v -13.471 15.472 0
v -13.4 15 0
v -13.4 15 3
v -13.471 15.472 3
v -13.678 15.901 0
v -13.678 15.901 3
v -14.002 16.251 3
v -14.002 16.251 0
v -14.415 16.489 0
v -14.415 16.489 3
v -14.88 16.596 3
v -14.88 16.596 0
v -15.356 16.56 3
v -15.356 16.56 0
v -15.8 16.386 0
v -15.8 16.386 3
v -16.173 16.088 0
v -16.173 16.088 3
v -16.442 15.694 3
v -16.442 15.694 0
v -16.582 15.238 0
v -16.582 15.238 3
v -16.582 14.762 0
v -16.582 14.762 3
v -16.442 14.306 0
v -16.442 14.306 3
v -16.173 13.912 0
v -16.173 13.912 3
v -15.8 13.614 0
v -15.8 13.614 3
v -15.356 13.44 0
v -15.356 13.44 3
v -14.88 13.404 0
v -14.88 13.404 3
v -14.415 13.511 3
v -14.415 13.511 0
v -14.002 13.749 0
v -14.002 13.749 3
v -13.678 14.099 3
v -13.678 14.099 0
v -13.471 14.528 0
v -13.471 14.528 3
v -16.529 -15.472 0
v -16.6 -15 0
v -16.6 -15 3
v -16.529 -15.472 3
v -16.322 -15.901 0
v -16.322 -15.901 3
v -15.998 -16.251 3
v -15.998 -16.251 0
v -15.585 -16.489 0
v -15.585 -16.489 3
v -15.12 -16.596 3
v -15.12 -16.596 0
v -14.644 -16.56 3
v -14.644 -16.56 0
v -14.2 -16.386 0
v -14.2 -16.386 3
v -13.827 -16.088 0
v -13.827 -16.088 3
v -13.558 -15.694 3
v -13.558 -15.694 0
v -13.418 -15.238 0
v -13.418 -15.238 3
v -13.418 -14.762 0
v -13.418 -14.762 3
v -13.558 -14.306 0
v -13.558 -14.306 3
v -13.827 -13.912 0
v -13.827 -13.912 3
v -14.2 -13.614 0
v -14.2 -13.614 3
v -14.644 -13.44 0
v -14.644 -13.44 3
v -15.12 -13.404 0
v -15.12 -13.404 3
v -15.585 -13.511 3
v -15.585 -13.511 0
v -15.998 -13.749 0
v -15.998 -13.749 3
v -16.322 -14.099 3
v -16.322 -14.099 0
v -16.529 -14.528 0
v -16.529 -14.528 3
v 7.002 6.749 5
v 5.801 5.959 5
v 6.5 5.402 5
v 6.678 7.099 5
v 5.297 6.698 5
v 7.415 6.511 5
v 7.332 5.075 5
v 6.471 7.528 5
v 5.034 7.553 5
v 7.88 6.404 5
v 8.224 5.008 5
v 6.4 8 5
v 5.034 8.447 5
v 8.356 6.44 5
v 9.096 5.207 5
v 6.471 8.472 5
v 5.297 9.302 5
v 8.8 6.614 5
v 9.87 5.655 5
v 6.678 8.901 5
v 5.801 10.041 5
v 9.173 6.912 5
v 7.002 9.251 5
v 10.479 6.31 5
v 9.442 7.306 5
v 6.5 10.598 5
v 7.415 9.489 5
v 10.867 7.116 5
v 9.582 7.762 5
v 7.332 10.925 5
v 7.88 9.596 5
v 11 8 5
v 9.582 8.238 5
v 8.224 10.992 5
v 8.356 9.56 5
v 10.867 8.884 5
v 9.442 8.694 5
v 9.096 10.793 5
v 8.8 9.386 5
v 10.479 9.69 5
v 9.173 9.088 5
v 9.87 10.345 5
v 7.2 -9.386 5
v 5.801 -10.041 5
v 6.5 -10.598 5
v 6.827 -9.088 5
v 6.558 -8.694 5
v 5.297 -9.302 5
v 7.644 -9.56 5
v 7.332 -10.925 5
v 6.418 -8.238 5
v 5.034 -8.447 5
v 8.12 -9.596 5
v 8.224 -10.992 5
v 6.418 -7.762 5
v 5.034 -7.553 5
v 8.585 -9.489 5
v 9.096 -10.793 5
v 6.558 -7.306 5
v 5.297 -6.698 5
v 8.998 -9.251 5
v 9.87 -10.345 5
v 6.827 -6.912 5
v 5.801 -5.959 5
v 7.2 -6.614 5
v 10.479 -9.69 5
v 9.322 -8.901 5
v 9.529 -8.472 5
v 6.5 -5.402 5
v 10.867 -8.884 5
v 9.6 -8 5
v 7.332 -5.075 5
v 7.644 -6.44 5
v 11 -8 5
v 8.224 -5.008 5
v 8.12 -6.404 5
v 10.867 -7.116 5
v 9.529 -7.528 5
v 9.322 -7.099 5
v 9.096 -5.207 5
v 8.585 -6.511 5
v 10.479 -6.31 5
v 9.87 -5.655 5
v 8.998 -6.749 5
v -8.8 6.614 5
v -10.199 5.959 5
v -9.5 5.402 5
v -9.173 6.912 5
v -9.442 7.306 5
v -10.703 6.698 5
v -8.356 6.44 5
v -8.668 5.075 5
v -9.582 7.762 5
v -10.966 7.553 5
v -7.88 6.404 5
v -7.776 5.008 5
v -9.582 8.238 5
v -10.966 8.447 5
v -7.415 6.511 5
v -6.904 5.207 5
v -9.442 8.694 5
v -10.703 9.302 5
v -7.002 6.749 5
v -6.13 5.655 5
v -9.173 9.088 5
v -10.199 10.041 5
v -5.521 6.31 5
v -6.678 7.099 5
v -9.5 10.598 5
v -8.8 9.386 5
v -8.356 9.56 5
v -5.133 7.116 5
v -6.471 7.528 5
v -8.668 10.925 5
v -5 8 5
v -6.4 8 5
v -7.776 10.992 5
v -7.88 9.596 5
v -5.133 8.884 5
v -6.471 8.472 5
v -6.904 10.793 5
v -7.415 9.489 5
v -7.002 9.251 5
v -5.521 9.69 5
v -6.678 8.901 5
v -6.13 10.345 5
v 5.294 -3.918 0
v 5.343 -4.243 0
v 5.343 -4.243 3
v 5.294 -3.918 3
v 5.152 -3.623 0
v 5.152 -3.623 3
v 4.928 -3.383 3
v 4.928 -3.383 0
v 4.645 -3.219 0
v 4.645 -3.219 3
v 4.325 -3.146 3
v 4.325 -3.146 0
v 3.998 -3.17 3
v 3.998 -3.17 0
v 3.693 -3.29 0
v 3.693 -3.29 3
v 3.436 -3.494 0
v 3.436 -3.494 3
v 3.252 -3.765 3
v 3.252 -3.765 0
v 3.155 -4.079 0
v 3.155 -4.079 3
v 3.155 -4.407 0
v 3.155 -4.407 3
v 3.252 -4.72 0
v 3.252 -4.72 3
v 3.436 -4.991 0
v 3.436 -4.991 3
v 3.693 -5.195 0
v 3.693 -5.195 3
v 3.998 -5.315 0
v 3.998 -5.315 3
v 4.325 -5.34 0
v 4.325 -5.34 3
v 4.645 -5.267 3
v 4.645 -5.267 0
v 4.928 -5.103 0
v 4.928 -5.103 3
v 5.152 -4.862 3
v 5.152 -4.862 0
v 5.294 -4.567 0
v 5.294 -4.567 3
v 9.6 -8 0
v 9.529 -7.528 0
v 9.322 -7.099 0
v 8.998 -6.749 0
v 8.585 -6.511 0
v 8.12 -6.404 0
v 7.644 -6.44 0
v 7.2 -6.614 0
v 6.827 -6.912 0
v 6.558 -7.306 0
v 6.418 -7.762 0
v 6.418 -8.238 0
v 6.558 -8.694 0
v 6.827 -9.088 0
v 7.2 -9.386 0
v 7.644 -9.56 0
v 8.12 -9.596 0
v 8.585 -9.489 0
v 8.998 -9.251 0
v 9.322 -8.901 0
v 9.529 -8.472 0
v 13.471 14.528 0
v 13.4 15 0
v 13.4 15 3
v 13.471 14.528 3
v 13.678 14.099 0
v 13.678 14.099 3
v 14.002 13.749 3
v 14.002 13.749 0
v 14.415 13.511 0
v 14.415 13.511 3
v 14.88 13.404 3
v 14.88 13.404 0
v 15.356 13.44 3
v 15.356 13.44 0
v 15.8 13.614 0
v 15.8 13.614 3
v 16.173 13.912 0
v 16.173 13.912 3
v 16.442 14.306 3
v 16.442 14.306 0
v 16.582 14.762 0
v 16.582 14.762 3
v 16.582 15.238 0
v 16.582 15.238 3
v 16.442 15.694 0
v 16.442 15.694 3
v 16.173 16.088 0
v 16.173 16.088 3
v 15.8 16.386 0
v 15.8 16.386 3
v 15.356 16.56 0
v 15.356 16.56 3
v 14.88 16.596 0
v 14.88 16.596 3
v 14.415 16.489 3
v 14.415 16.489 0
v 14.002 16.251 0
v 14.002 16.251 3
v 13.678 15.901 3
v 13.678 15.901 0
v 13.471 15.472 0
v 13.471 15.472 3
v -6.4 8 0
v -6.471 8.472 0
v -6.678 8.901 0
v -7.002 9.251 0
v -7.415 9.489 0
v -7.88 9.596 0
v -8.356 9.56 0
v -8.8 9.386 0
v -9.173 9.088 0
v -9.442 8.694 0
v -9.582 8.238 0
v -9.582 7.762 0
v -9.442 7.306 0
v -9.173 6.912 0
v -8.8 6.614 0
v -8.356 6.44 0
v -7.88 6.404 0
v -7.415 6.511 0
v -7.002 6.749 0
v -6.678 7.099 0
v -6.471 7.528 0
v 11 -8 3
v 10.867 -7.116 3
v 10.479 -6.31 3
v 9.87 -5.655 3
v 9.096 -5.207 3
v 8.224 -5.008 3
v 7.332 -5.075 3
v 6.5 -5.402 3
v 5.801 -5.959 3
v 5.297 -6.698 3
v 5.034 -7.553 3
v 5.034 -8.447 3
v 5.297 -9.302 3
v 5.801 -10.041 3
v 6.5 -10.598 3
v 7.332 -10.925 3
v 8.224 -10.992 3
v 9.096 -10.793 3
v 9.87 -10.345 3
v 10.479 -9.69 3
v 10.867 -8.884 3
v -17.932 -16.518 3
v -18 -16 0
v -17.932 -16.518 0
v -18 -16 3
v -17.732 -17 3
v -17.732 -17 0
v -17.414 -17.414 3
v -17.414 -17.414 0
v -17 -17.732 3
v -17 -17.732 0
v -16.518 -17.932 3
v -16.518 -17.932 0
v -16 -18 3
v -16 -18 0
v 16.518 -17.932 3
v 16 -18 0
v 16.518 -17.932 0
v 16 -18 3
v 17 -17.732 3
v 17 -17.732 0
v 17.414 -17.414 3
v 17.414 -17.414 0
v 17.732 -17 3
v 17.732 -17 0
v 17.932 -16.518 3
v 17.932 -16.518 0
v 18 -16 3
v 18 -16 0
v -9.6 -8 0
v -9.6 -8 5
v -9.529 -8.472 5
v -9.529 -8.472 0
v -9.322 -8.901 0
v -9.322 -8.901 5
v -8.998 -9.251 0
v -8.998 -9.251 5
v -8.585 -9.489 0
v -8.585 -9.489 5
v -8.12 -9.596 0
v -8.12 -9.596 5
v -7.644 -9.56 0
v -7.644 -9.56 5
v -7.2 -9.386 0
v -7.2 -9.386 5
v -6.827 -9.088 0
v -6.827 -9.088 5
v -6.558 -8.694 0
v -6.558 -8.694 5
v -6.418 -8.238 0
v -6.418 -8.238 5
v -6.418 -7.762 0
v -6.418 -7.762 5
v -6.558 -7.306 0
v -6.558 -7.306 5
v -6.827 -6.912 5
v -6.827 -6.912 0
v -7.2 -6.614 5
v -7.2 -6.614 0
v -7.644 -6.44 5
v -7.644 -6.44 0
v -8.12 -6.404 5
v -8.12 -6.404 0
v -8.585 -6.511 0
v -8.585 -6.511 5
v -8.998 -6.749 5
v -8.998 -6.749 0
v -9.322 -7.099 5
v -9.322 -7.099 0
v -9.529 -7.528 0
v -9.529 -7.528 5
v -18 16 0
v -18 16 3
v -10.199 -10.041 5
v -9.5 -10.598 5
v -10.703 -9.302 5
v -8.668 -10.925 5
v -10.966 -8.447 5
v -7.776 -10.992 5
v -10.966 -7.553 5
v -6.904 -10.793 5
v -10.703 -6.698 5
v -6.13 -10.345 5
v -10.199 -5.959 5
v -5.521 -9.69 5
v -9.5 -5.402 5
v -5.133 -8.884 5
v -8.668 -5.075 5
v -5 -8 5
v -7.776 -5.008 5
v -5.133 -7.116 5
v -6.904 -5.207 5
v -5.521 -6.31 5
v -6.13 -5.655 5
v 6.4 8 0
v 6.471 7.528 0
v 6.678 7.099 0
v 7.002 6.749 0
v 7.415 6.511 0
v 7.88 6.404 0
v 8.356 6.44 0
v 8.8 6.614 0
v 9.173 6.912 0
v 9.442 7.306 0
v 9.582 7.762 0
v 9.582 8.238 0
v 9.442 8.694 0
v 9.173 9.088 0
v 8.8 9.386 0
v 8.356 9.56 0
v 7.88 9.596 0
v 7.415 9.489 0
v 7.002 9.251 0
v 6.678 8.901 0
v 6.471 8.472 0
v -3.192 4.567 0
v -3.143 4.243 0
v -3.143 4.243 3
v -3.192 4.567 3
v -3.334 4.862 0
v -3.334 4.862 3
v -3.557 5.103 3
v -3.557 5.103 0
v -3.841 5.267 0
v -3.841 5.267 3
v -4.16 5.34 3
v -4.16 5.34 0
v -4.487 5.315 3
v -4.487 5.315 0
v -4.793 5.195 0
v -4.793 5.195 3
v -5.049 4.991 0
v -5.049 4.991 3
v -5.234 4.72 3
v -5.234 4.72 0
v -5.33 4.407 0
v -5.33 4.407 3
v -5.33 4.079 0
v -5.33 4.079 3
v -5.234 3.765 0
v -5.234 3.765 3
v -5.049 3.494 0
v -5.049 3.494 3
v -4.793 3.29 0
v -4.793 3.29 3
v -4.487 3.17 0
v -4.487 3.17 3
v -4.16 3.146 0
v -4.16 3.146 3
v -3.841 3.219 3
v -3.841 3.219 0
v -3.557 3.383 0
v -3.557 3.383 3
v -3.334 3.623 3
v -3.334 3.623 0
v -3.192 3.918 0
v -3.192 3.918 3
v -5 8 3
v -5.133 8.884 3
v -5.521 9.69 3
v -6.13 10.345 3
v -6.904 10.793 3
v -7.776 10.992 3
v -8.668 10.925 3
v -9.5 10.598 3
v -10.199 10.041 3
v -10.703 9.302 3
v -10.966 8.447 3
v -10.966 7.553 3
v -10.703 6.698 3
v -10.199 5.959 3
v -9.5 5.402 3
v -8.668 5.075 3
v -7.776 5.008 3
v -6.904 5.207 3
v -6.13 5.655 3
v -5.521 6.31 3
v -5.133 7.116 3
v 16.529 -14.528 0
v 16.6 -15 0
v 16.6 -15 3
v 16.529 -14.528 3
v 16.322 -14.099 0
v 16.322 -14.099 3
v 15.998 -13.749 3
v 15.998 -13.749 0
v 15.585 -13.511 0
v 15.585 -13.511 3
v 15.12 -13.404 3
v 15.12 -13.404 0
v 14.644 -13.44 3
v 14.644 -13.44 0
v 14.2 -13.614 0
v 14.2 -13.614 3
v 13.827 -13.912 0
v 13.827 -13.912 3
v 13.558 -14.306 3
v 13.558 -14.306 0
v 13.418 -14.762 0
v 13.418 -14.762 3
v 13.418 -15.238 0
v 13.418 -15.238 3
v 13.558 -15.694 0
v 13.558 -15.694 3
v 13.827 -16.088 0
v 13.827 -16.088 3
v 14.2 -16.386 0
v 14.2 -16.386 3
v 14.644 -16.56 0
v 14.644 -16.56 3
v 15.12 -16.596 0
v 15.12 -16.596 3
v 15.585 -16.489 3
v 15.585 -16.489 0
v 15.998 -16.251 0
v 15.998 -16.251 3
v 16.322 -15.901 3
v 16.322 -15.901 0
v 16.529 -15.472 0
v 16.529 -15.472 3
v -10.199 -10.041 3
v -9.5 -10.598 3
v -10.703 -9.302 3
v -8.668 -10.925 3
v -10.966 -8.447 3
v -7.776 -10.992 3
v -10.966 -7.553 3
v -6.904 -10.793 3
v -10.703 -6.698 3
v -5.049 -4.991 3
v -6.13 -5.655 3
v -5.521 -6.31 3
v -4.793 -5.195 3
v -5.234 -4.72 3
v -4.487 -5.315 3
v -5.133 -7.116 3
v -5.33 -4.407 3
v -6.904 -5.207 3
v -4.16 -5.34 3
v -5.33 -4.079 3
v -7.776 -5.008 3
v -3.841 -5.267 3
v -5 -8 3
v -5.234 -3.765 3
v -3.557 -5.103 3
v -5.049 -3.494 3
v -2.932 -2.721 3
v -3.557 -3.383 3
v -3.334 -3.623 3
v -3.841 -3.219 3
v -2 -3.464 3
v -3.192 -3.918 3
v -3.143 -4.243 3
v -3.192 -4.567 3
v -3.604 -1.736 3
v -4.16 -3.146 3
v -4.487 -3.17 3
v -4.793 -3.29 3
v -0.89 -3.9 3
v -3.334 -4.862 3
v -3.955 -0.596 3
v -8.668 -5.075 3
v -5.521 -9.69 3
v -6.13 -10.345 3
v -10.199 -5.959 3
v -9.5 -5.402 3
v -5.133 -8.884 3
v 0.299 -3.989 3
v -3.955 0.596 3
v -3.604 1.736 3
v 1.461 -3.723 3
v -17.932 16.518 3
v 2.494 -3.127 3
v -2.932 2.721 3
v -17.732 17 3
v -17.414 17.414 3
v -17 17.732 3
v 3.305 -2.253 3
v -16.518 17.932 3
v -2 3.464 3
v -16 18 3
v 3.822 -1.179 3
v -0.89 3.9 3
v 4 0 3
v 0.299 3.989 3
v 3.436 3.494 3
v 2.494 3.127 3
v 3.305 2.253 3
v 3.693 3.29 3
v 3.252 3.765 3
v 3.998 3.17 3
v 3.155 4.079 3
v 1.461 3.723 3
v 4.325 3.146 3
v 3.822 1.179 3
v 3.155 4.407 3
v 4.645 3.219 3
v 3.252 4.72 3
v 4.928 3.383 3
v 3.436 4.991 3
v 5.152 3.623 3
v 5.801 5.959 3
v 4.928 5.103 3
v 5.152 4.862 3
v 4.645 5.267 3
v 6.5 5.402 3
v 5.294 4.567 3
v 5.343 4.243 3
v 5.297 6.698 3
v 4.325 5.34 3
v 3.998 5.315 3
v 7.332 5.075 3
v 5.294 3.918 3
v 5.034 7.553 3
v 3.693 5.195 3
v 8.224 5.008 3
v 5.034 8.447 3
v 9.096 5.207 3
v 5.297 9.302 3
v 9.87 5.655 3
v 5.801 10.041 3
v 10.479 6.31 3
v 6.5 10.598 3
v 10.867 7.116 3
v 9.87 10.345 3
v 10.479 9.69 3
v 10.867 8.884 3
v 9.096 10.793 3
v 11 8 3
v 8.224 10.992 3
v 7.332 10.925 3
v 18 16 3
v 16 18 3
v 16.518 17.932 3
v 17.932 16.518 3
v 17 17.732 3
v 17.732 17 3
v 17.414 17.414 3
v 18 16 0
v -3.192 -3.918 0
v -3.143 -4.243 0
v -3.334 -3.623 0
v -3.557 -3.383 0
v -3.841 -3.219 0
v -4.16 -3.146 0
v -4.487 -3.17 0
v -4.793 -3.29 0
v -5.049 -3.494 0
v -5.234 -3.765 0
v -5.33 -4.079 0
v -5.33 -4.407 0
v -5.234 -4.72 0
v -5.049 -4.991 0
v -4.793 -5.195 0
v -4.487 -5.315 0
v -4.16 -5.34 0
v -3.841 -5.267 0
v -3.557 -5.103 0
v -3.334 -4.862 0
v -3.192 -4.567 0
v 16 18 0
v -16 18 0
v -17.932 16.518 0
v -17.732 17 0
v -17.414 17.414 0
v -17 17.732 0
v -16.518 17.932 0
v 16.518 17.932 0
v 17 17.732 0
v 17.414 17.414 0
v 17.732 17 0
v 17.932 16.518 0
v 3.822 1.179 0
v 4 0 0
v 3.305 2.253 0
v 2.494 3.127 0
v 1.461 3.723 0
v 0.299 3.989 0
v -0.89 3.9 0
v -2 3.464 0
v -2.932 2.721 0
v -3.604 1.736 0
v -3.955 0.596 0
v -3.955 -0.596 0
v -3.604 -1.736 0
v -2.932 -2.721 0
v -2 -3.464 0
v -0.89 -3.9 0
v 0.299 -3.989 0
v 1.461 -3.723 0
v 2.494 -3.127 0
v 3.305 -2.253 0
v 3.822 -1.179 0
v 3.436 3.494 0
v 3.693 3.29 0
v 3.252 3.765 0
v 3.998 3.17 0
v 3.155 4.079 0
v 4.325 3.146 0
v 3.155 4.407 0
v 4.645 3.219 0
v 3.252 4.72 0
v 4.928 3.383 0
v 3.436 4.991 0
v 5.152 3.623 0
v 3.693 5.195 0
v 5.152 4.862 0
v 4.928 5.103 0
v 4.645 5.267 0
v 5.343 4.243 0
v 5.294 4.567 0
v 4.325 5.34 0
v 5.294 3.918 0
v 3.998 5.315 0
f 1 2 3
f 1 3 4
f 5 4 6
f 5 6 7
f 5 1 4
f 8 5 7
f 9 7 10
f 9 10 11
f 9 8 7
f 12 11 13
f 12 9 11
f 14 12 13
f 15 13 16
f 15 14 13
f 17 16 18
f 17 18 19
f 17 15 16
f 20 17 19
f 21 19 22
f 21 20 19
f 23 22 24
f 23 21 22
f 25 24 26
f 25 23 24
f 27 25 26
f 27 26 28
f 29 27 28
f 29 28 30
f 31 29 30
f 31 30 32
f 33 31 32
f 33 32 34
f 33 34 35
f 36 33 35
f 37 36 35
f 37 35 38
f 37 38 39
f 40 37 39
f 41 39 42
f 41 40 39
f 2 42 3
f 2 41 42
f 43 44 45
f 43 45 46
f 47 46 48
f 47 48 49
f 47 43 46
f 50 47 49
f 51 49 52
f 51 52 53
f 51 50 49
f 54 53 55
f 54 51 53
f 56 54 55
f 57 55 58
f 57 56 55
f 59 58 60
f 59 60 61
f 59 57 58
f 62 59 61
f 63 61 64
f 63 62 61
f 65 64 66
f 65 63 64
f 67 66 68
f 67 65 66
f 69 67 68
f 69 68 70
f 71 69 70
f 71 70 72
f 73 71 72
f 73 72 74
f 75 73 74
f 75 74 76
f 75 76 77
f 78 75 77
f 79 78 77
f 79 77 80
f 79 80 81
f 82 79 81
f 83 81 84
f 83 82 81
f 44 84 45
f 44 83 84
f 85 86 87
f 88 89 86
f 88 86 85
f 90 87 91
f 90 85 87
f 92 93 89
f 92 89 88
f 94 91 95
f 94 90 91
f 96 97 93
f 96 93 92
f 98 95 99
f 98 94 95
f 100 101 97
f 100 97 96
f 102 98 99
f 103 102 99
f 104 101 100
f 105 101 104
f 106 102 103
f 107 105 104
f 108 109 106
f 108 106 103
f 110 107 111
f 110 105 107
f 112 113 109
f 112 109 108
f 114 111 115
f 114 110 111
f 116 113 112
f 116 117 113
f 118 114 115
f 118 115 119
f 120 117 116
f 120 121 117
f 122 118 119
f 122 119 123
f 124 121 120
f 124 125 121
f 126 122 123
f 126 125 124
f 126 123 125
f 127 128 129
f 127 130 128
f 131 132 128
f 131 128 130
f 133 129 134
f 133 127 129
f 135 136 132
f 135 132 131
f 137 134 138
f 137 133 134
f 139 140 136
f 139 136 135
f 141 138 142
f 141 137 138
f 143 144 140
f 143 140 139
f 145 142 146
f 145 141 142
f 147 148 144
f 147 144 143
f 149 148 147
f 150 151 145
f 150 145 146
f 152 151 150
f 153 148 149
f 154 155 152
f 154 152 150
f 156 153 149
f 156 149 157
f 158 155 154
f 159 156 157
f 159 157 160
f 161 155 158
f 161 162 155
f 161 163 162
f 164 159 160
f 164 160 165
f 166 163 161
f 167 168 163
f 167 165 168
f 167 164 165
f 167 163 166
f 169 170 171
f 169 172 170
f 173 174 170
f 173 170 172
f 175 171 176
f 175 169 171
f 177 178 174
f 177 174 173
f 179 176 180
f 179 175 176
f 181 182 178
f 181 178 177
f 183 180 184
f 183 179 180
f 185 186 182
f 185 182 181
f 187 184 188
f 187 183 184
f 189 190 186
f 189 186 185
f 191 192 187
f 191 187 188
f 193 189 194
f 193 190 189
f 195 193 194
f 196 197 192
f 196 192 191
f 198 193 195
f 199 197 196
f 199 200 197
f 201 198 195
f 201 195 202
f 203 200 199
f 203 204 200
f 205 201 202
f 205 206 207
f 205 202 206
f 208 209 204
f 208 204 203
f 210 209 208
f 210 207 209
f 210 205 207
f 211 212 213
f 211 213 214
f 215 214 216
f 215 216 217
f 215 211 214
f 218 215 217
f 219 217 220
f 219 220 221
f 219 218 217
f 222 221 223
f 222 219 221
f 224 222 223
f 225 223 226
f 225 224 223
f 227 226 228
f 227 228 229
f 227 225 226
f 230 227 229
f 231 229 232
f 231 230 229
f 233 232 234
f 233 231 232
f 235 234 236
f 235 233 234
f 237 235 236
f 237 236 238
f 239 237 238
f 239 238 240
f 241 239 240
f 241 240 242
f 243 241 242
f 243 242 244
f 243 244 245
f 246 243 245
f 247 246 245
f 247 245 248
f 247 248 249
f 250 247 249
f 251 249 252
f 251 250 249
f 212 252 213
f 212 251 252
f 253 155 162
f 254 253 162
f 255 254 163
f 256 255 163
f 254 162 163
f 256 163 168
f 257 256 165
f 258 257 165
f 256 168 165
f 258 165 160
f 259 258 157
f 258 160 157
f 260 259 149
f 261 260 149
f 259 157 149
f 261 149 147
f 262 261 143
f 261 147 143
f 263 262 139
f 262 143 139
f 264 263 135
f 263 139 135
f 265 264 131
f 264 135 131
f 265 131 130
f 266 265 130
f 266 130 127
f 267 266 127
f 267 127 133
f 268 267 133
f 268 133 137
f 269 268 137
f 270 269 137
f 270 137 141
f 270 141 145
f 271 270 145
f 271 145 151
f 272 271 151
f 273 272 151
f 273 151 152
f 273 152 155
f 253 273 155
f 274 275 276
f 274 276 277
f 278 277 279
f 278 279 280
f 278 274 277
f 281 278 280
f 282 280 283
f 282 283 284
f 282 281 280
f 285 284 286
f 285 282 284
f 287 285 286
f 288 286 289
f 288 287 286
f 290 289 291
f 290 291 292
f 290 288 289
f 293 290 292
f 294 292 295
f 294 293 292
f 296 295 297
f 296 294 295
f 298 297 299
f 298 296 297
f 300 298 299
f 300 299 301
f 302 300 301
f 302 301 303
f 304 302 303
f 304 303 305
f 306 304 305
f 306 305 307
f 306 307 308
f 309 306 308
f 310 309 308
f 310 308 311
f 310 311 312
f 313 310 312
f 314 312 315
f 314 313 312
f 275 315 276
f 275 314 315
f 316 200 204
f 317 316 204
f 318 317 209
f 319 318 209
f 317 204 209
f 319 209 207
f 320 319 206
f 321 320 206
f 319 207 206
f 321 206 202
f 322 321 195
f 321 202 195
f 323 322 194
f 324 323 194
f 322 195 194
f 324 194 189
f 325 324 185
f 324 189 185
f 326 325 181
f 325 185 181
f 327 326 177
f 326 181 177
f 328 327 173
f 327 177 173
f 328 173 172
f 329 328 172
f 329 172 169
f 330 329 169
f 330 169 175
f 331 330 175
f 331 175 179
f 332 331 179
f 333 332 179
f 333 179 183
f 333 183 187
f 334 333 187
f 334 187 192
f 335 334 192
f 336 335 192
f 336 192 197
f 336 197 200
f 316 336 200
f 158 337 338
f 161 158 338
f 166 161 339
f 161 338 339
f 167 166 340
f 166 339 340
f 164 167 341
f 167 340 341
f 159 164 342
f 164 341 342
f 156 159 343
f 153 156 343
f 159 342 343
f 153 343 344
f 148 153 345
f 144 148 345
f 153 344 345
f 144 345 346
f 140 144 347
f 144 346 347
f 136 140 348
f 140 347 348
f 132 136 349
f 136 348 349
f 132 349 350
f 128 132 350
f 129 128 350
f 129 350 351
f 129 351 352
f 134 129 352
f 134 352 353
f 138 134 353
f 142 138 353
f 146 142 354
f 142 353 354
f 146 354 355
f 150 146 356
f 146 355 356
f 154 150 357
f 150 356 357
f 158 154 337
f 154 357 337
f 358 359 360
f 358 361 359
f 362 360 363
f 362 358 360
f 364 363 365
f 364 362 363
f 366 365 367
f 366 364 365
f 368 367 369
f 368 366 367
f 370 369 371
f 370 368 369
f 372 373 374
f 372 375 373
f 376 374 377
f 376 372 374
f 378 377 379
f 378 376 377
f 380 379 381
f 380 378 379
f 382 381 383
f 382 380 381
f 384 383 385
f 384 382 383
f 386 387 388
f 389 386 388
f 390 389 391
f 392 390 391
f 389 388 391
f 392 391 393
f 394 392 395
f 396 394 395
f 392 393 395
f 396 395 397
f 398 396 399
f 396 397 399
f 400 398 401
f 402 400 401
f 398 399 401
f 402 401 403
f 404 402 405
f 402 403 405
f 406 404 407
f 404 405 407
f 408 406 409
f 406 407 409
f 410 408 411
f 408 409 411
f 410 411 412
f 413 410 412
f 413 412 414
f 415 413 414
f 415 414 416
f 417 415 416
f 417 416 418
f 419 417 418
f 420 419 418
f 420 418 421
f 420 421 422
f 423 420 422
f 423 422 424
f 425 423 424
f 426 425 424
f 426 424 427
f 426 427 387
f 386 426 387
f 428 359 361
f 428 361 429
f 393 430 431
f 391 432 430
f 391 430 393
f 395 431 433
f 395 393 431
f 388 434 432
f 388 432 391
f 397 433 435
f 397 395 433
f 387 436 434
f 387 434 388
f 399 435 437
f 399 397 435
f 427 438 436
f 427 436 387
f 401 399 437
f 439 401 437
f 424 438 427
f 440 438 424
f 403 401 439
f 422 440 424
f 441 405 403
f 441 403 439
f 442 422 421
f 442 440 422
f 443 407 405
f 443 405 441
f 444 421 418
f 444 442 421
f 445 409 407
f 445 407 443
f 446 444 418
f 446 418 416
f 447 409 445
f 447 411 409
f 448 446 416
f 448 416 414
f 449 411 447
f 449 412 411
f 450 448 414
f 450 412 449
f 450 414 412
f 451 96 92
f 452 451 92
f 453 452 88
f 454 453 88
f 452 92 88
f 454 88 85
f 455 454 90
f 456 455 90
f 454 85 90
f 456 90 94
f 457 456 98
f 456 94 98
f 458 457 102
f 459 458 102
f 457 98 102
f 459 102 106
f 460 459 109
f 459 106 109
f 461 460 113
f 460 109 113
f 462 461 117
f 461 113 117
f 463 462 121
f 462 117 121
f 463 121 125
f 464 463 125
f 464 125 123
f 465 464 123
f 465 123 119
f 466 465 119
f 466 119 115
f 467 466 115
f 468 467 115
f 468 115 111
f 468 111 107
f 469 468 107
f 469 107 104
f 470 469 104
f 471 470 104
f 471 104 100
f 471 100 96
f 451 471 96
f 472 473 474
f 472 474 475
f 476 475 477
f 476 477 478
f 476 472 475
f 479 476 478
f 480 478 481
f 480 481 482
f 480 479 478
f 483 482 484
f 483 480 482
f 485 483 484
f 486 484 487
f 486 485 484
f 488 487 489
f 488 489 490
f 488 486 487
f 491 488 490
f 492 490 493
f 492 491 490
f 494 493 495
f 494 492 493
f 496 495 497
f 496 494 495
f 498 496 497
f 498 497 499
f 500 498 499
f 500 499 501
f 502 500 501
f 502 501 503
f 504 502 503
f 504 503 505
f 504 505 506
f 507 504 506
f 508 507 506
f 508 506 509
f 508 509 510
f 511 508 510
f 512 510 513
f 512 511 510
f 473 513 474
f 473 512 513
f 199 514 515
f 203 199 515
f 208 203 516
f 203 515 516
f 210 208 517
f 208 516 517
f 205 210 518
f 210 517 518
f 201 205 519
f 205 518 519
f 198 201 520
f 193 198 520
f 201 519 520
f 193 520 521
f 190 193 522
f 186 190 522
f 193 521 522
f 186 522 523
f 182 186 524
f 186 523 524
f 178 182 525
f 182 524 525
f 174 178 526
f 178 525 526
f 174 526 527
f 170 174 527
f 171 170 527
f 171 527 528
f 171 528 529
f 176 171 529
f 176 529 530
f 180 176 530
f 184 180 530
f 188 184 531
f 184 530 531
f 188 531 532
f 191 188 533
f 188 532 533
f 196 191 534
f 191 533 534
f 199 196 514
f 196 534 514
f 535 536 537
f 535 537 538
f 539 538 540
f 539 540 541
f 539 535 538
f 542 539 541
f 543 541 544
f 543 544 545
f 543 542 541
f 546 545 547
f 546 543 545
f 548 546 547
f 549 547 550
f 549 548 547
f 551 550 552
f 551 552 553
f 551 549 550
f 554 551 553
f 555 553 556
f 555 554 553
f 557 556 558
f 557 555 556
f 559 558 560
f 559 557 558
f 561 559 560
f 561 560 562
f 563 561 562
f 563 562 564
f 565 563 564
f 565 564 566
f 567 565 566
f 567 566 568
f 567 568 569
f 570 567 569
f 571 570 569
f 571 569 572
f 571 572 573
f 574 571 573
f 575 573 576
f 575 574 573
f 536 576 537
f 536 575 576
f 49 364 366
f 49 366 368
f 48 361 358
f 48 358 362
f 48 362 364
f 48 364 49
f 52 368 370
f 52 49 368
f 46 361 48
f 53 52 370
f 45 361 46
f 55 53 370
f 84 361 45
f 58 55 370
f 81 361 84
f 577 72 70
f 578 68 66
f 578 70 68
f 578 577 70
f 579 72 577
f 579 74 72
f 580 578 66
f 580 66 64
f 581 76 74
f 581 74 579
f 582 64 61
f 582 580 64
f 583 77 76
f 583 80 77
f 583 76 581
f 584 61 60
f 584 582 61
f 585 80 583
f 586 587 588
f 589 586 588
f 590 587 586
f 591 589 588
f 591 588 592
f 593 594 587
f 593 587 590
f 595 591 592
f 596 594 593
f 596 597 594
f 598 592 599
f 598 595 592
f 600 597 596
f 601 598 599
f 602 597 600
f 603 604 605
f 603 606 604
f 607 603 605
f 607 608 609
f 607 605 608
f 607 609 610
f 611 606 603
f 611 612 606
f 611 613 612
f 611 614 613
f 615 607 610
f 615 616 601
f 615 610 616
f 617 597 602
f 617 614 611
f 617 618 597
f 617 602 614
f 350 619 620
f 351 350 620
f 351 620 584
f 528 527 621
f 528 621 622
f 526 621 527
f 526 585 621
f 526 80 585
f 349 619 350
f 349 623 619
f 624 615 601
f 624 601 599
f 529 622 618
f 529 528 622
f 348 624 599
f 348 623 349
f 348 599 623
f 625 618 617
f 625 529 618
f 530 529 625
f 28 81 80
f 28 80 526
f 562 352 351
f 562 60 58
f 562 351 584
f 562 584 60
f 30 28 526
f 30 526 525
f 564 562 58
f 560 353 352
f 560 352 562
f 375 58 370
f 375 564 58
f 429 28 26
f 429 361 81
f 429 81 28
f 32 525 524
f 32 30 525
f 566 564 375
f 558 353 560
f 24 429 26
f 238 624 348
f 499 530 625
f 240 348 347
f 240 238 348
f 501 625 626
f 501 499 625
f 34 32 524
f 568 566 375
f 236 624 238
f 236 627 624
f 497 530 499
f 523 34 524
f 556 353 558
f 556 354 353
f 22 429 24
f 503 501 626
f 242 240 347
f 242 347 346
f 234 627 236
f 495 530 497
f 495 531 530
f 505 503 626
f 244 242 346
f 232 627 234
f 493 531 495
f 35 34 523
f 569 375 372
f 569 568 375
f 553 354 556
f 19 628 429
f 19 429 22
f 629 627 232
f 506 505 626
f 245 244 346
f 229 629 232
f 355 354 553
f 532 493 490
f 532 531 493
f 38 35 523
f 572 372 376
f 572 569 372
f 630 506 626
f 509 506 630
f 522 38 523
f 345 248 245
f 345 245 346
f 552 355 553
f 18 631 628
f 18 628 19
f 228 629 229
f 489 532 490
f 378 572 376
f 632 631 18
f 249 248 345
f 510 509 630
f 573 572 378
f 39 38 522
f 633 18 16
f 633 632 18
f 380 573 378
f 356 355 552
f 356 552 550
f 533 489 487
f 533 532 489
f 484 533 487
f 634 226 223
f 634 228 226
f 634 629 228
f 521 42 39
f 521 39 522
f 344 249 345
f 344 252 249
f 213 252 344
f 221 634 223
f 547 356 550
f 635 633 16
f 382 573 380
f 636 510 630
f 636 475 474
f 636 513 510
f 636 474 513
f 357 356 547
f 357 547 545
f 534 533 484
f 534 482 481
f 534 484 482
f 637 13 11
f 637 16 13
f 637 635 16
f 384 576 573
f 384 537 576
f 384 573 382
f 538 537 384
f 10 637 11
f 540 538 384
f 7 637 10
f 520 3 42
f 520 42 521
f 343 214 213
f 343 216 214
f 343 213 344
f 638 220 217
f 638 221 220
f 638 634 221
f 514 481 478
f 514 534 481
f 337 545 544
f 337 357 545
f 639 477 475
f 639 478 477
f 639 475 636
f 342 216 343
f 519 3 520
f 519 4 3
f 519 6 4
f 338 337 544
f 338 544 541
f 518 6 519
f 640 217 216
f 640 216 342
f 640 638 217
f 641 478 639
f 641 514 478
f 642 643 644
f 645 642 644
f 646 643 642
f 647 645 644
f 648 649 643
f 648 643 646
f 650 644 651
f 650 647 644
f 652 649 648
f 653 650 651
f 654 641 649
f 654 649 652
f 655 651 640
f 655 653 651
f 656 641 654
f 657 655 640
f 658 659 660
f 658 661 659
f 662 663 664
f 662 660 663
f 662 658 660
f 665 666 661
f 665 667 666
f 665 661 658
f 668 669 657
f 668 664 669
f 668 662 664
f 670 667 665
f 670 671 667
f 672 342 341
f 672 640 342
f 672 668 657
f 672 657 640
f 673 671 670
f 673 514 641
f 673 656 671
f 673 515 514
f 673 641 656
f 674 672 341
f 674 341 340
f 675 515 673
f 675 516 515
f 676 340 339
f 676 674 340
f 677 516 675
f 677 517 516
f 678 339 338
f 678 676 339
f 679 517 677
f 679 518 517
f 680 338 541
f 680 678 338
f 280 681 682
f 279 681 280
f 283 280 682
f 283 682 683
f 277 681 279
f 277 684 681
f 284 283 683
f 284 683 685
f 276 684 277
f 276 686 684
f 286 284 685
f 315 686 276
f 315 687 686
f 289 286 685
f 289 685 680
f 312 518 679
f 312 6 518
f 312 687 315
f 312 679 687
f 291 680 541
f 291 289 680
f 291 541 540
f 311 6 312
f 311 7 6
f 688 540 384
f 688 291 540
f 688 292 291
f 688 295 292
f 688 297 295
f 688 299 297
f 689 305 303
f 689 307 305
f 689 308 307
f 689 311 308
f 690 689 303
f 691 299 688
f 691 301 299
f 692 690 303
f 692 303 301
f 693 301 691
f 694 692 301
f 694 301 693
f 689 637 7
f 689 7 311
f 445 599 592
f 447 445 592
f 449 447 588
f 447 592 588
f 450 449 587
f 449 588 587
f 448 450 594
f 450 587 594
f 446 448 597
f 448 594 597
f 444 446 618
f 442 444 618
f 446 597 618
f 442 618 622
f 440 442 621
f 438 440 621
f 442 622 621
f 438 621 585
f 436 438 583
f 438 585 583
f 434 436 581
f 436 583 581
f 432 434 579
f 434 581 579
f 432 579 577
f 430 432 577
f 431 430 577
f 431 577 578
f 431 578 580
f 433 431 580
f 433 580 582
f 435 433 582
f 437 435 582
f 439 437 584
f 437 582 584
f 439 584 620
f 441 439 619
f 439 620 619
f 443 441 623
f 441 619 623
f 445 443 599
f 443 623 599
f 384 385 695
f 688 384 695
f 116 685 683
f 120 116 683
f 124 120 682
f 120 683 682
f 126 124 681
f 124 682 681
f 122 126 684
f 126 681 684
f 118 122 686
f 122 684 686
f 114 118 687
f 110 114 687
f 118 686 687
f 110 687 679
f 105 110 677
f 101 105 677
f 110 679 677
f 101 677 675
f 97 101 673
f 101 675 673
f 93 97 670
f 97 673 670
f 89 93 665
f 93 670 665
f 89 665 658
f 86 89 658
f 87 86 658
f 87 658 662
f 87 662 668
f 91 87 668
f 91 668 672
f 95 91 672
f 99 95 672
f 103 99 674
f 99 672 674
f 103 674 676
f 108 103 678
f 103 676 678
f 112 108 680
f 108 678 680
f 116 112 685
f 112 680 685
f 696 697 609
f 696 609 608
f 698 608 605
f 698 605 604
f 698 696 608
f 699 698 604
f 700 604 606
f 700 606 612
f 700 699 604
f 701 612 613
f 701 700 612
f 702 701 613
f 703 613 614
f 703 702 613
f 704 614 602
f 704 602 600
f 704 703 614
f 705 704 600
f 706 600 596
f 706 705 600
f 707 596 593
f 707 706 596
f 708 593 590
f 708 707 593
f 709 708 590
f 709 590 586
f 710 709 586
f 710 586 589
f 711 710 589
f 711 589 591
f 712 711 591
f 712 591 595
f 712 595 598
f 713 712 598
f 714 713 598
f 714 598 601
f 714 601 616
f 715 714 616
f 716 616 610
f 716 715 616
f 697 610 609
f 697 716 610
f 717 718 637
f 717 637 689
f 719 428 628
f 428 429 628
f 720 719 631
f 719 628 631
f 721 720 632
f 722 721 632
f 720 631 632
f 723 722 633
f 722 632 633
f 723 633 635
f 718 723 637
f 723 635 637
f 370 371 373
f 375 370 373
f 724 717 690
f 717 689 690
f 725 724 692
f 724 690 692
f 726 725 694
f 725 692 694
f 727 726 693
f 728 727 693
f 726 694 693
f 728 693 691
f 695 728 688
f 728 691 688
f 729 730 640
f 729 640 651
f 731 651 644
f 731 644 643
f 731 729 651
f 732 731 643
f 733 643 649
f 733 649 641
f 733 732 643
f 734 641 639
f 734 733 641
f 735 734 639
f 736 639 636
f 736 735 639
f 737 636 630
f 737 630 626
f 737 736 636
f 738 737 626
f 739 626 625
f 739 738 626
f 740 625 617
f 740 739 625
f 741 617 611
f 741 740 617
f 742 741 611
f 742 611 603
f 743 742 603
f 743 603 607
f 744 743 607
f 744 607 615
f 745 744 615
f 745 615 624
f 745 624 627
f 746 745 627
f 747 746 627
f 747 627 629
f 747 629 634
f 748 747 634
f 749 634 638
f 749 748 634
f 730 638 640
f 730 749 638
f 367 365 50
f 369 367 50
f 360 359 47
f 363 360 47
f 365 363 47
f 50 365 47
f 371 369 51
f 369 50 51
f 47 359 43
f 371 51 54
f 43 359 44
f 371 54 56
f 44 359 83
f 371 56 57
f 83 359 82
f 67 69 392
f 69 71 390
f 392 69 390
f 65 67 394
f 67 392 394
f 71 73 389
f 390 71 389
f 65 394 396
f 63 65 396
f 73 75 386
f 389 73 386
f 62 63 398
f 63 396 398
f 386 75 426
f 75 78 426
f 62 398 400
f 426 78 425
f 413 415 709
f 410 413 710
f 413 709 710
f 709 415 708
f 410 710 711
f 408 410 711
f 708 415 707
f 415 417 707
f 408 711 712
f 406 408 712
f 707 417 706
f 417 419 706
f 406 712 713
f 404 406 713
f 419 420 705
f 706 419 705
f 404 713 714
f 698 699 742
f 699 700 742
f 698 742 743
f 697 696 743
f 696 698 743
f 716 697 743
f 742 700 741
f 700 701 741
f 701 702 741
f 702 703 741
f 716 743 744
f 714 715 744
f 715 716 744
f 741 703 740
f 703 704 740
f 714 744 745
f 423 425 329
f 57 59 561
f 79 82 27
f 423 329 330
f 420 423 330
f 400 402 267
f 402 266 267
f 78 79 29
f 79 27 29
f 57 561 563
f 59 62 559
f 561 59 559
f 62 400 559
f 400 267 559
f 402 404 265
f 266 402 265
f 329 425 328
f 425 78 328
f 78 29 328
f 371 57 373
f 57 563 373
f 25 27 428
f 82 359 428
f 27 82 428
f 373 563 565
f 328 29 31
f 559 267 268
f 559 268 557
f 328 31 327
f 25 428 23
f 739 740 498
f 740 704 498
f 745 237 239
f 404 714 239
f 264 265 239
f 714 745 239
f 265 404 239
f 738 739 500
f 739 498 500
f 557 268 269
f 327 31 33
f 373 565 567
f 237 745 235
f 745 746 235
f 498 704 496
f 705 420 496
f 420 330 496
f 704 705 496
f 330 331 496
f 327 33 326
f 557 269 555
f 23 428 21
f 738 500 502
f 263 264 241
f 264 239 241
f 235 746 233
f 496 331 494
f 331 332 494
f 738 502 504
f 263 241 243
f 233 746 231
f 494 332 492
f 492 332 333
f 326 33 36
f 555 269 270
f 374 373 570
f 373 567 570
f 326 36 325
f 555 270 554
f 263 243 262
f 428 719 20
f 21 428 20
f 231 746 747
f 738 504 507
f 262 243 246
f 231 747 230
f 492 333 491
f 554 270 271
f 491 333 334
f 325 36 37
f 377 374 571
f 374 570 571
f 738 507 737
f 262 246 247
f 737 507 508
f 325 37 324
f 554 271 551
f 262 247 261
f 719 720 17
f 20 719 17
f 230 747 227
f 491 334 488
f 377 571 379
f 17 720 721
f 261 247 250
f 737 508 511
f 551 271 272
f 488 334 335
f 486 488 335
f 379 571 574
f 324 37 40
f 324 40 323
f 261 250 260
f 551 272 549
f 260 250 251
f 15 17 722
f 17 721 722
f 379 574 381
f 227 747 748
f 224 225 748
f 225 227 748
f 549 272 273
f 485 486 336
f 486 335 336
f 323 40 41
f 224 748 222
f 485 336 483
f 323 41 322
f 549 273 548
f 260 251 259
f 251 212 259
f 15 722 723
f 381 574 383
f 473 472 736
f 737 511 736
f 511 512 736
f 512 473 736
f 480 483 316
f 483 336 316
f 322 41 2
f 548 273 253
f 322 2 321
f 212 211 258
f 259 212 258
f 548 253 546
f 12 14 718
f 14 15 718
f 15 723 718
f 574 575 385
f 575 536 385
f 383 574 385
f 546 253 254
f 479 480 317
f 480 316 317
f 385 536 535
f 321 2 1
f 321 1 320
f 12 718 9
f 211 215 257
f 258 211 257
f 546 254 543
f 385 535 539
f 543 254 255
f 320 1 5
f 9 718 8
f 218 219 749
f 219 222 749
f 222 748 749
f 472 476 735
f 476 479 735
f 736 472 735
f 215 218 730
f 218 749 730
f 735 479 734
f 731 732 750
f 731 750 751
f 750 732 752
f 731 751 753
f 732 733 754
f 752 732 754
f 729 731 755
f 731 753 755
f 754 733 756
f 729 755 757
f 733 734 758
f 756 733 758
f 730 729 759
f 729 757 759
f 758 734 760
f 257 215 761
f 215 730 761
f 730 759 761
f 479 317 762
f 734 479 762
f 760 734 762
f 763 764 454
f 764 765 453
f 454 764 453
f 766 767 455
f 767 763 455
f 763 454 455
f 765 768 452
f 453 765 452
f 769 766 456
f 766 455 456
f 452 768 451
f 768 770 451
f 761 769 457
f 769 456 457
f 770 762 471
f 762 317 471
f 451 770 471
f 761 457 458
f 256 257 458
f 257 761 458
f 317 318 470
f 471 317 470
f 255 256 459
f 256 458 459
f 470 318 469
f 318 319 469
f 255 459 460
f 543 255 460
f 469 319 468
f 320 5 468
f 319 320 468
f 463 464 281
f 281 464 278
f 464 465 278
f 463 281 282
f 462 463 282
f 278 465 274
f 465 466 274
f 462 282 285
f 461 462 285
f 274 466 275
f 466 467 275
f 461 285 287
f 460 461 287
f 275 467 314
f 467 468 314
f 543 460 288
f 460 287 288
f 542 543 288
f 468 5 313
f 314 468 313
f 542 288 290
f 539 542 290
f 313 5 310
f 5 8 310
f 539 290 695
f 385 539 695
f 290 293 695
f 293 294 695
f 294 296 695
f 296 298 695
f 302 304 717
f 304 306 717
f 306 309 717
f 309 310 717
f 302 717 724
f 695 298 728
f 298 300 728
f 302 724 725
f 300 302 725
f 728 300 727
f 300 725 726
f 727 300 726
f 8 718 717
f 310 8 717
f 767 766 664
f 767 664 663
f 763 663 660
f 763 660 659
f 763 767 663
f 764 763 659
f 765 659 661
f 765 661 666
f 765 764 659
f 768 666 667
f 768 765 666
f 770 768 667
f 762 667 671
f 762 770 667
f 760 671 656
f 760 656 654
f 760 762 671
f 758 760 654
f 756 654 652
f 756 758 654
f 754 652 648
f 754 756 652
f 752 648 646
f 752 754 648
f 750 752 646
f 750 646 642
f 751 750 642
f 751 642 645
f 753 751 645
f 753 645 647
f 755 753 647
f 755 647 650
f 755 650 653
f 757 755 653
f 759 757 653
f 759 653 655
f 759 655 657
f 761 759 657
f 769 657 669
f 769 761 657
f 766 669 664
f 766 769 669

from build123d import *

# Parameters (mm, degrees)
ESQUISSE1_W             = 36
ESQUISSE1_H             = 36
ESQUISSE1_R             = 1.1
ESQUISSE1_R_2           = 4
ESQUISSE1_R_3           = 1.6
BOSS_EXTRU_1_DEPTH      = 3
ESQUISSE2_R             = 3
BOSS_EXTRU_2_DEPTH      = 2
ESQUISSE3_R             = 1.6
ENL_V_MAT_EXTRU_1_DEPTH = 26.942243542
CONG_1_R                = 2


with BuildPart() as part:
    # Esquisse1 → Boss.-Extru.1 (new body)
    with BuildSketch(Plane.XY):
        Rectangle(ESQUISSE1_W, ESQUISSE1_H)
        with Locations((-4.242640687, 4.242640687)):
            Circle(ESQUISSE1_R, mode=Mode.SUBTRACT)
        with Locations((4.242640687, 4.242640687)):
            Circle(ESQUISSE1_R, mode=Mode.SUBTRACT)
        with Locations((4.242640687, -4.242640687)):
            Circle(ESQUISSE1_R, mode=Mode.SUBTRACT)
        with Locations((-4.242640687, -4.242640687)):
            Circle(ESQUISSE1_R, mode=Mode.SUBTRACT)
        Circle(ESQUISSE1_R_2, mode=Mode.SUBTRACT)
        with Locations((-15, 15)):
            Circle(ESQUISSE1_R_3, mode=Mode.SUBTRACT)
        with Locations(Location((15, 15, 0), (0, 0, 180))):
            Circle(ESQUISSE1_R_3, mode=Mode.SUBTRACT)
        with Locations((15, -15)):
            Circle(ESQUISSE1_R_3, mode=Mode.SUBTRACT)
        with Locations(Location((-15, -15, 0), (0, 0, 180))):
            Circle(ESQUISSE1_R_3, mode=Mode.SUBTRACT)
    extrude(amount=BOSS_EXTRU_1_DEPTH)

    # Esquisse2 → Boss.-Extru.2 (add)
    with BuildSketch(Plane.XY.offset(3)):
        with Locations((-8, 8)):
            Circle(ESQUISSE2_R)
        with Locations((8, 8)):
            Circle(ESQUISSE2_R)
        with Locations((8, -8)):
            Circle(ESQUISSE2_R)
        with Locations((-8, -8)):
            Circle(ESQUISSE2_R)
    extrude(amount=BOSS_EXTRU_2_DEPTH)

    # Esquisse3 → Enlèv. mat.-Extru.1 (cut, through all)
    with BuildSketch(Plane.XY.offset(5)):
        with Locations((-8, 8)):
            Circle(ESQUISSE3_R)
        with Locations(Location((8, 8, 0), (0, 0, 180))):
            Circle(ESQUISSE3_R)
        with Locations((8, -8)):
            Circle(ESQUISSE3_R)
        with Locations(Location((-8, -8, 0), (0, 0, 180))):
            Circle(ESQUISSE3_R)
    extrude(amount=-ENL_V_MAT_EXTRU_1_DEPTH, mode=Mode.SUBTRACT)

    # Congé1
    cong_1_edges = [part.edges().sort_by_distance(p)[0] for p in [
        (-18, 18, 1.5),
        (18, 18, 1.5),
        (18, -18, 1.5),
        (-18, -18, 1.5),
    ]]
    fillet(cong_1_edges, radius=CONG_1_R)


solid = part.part
